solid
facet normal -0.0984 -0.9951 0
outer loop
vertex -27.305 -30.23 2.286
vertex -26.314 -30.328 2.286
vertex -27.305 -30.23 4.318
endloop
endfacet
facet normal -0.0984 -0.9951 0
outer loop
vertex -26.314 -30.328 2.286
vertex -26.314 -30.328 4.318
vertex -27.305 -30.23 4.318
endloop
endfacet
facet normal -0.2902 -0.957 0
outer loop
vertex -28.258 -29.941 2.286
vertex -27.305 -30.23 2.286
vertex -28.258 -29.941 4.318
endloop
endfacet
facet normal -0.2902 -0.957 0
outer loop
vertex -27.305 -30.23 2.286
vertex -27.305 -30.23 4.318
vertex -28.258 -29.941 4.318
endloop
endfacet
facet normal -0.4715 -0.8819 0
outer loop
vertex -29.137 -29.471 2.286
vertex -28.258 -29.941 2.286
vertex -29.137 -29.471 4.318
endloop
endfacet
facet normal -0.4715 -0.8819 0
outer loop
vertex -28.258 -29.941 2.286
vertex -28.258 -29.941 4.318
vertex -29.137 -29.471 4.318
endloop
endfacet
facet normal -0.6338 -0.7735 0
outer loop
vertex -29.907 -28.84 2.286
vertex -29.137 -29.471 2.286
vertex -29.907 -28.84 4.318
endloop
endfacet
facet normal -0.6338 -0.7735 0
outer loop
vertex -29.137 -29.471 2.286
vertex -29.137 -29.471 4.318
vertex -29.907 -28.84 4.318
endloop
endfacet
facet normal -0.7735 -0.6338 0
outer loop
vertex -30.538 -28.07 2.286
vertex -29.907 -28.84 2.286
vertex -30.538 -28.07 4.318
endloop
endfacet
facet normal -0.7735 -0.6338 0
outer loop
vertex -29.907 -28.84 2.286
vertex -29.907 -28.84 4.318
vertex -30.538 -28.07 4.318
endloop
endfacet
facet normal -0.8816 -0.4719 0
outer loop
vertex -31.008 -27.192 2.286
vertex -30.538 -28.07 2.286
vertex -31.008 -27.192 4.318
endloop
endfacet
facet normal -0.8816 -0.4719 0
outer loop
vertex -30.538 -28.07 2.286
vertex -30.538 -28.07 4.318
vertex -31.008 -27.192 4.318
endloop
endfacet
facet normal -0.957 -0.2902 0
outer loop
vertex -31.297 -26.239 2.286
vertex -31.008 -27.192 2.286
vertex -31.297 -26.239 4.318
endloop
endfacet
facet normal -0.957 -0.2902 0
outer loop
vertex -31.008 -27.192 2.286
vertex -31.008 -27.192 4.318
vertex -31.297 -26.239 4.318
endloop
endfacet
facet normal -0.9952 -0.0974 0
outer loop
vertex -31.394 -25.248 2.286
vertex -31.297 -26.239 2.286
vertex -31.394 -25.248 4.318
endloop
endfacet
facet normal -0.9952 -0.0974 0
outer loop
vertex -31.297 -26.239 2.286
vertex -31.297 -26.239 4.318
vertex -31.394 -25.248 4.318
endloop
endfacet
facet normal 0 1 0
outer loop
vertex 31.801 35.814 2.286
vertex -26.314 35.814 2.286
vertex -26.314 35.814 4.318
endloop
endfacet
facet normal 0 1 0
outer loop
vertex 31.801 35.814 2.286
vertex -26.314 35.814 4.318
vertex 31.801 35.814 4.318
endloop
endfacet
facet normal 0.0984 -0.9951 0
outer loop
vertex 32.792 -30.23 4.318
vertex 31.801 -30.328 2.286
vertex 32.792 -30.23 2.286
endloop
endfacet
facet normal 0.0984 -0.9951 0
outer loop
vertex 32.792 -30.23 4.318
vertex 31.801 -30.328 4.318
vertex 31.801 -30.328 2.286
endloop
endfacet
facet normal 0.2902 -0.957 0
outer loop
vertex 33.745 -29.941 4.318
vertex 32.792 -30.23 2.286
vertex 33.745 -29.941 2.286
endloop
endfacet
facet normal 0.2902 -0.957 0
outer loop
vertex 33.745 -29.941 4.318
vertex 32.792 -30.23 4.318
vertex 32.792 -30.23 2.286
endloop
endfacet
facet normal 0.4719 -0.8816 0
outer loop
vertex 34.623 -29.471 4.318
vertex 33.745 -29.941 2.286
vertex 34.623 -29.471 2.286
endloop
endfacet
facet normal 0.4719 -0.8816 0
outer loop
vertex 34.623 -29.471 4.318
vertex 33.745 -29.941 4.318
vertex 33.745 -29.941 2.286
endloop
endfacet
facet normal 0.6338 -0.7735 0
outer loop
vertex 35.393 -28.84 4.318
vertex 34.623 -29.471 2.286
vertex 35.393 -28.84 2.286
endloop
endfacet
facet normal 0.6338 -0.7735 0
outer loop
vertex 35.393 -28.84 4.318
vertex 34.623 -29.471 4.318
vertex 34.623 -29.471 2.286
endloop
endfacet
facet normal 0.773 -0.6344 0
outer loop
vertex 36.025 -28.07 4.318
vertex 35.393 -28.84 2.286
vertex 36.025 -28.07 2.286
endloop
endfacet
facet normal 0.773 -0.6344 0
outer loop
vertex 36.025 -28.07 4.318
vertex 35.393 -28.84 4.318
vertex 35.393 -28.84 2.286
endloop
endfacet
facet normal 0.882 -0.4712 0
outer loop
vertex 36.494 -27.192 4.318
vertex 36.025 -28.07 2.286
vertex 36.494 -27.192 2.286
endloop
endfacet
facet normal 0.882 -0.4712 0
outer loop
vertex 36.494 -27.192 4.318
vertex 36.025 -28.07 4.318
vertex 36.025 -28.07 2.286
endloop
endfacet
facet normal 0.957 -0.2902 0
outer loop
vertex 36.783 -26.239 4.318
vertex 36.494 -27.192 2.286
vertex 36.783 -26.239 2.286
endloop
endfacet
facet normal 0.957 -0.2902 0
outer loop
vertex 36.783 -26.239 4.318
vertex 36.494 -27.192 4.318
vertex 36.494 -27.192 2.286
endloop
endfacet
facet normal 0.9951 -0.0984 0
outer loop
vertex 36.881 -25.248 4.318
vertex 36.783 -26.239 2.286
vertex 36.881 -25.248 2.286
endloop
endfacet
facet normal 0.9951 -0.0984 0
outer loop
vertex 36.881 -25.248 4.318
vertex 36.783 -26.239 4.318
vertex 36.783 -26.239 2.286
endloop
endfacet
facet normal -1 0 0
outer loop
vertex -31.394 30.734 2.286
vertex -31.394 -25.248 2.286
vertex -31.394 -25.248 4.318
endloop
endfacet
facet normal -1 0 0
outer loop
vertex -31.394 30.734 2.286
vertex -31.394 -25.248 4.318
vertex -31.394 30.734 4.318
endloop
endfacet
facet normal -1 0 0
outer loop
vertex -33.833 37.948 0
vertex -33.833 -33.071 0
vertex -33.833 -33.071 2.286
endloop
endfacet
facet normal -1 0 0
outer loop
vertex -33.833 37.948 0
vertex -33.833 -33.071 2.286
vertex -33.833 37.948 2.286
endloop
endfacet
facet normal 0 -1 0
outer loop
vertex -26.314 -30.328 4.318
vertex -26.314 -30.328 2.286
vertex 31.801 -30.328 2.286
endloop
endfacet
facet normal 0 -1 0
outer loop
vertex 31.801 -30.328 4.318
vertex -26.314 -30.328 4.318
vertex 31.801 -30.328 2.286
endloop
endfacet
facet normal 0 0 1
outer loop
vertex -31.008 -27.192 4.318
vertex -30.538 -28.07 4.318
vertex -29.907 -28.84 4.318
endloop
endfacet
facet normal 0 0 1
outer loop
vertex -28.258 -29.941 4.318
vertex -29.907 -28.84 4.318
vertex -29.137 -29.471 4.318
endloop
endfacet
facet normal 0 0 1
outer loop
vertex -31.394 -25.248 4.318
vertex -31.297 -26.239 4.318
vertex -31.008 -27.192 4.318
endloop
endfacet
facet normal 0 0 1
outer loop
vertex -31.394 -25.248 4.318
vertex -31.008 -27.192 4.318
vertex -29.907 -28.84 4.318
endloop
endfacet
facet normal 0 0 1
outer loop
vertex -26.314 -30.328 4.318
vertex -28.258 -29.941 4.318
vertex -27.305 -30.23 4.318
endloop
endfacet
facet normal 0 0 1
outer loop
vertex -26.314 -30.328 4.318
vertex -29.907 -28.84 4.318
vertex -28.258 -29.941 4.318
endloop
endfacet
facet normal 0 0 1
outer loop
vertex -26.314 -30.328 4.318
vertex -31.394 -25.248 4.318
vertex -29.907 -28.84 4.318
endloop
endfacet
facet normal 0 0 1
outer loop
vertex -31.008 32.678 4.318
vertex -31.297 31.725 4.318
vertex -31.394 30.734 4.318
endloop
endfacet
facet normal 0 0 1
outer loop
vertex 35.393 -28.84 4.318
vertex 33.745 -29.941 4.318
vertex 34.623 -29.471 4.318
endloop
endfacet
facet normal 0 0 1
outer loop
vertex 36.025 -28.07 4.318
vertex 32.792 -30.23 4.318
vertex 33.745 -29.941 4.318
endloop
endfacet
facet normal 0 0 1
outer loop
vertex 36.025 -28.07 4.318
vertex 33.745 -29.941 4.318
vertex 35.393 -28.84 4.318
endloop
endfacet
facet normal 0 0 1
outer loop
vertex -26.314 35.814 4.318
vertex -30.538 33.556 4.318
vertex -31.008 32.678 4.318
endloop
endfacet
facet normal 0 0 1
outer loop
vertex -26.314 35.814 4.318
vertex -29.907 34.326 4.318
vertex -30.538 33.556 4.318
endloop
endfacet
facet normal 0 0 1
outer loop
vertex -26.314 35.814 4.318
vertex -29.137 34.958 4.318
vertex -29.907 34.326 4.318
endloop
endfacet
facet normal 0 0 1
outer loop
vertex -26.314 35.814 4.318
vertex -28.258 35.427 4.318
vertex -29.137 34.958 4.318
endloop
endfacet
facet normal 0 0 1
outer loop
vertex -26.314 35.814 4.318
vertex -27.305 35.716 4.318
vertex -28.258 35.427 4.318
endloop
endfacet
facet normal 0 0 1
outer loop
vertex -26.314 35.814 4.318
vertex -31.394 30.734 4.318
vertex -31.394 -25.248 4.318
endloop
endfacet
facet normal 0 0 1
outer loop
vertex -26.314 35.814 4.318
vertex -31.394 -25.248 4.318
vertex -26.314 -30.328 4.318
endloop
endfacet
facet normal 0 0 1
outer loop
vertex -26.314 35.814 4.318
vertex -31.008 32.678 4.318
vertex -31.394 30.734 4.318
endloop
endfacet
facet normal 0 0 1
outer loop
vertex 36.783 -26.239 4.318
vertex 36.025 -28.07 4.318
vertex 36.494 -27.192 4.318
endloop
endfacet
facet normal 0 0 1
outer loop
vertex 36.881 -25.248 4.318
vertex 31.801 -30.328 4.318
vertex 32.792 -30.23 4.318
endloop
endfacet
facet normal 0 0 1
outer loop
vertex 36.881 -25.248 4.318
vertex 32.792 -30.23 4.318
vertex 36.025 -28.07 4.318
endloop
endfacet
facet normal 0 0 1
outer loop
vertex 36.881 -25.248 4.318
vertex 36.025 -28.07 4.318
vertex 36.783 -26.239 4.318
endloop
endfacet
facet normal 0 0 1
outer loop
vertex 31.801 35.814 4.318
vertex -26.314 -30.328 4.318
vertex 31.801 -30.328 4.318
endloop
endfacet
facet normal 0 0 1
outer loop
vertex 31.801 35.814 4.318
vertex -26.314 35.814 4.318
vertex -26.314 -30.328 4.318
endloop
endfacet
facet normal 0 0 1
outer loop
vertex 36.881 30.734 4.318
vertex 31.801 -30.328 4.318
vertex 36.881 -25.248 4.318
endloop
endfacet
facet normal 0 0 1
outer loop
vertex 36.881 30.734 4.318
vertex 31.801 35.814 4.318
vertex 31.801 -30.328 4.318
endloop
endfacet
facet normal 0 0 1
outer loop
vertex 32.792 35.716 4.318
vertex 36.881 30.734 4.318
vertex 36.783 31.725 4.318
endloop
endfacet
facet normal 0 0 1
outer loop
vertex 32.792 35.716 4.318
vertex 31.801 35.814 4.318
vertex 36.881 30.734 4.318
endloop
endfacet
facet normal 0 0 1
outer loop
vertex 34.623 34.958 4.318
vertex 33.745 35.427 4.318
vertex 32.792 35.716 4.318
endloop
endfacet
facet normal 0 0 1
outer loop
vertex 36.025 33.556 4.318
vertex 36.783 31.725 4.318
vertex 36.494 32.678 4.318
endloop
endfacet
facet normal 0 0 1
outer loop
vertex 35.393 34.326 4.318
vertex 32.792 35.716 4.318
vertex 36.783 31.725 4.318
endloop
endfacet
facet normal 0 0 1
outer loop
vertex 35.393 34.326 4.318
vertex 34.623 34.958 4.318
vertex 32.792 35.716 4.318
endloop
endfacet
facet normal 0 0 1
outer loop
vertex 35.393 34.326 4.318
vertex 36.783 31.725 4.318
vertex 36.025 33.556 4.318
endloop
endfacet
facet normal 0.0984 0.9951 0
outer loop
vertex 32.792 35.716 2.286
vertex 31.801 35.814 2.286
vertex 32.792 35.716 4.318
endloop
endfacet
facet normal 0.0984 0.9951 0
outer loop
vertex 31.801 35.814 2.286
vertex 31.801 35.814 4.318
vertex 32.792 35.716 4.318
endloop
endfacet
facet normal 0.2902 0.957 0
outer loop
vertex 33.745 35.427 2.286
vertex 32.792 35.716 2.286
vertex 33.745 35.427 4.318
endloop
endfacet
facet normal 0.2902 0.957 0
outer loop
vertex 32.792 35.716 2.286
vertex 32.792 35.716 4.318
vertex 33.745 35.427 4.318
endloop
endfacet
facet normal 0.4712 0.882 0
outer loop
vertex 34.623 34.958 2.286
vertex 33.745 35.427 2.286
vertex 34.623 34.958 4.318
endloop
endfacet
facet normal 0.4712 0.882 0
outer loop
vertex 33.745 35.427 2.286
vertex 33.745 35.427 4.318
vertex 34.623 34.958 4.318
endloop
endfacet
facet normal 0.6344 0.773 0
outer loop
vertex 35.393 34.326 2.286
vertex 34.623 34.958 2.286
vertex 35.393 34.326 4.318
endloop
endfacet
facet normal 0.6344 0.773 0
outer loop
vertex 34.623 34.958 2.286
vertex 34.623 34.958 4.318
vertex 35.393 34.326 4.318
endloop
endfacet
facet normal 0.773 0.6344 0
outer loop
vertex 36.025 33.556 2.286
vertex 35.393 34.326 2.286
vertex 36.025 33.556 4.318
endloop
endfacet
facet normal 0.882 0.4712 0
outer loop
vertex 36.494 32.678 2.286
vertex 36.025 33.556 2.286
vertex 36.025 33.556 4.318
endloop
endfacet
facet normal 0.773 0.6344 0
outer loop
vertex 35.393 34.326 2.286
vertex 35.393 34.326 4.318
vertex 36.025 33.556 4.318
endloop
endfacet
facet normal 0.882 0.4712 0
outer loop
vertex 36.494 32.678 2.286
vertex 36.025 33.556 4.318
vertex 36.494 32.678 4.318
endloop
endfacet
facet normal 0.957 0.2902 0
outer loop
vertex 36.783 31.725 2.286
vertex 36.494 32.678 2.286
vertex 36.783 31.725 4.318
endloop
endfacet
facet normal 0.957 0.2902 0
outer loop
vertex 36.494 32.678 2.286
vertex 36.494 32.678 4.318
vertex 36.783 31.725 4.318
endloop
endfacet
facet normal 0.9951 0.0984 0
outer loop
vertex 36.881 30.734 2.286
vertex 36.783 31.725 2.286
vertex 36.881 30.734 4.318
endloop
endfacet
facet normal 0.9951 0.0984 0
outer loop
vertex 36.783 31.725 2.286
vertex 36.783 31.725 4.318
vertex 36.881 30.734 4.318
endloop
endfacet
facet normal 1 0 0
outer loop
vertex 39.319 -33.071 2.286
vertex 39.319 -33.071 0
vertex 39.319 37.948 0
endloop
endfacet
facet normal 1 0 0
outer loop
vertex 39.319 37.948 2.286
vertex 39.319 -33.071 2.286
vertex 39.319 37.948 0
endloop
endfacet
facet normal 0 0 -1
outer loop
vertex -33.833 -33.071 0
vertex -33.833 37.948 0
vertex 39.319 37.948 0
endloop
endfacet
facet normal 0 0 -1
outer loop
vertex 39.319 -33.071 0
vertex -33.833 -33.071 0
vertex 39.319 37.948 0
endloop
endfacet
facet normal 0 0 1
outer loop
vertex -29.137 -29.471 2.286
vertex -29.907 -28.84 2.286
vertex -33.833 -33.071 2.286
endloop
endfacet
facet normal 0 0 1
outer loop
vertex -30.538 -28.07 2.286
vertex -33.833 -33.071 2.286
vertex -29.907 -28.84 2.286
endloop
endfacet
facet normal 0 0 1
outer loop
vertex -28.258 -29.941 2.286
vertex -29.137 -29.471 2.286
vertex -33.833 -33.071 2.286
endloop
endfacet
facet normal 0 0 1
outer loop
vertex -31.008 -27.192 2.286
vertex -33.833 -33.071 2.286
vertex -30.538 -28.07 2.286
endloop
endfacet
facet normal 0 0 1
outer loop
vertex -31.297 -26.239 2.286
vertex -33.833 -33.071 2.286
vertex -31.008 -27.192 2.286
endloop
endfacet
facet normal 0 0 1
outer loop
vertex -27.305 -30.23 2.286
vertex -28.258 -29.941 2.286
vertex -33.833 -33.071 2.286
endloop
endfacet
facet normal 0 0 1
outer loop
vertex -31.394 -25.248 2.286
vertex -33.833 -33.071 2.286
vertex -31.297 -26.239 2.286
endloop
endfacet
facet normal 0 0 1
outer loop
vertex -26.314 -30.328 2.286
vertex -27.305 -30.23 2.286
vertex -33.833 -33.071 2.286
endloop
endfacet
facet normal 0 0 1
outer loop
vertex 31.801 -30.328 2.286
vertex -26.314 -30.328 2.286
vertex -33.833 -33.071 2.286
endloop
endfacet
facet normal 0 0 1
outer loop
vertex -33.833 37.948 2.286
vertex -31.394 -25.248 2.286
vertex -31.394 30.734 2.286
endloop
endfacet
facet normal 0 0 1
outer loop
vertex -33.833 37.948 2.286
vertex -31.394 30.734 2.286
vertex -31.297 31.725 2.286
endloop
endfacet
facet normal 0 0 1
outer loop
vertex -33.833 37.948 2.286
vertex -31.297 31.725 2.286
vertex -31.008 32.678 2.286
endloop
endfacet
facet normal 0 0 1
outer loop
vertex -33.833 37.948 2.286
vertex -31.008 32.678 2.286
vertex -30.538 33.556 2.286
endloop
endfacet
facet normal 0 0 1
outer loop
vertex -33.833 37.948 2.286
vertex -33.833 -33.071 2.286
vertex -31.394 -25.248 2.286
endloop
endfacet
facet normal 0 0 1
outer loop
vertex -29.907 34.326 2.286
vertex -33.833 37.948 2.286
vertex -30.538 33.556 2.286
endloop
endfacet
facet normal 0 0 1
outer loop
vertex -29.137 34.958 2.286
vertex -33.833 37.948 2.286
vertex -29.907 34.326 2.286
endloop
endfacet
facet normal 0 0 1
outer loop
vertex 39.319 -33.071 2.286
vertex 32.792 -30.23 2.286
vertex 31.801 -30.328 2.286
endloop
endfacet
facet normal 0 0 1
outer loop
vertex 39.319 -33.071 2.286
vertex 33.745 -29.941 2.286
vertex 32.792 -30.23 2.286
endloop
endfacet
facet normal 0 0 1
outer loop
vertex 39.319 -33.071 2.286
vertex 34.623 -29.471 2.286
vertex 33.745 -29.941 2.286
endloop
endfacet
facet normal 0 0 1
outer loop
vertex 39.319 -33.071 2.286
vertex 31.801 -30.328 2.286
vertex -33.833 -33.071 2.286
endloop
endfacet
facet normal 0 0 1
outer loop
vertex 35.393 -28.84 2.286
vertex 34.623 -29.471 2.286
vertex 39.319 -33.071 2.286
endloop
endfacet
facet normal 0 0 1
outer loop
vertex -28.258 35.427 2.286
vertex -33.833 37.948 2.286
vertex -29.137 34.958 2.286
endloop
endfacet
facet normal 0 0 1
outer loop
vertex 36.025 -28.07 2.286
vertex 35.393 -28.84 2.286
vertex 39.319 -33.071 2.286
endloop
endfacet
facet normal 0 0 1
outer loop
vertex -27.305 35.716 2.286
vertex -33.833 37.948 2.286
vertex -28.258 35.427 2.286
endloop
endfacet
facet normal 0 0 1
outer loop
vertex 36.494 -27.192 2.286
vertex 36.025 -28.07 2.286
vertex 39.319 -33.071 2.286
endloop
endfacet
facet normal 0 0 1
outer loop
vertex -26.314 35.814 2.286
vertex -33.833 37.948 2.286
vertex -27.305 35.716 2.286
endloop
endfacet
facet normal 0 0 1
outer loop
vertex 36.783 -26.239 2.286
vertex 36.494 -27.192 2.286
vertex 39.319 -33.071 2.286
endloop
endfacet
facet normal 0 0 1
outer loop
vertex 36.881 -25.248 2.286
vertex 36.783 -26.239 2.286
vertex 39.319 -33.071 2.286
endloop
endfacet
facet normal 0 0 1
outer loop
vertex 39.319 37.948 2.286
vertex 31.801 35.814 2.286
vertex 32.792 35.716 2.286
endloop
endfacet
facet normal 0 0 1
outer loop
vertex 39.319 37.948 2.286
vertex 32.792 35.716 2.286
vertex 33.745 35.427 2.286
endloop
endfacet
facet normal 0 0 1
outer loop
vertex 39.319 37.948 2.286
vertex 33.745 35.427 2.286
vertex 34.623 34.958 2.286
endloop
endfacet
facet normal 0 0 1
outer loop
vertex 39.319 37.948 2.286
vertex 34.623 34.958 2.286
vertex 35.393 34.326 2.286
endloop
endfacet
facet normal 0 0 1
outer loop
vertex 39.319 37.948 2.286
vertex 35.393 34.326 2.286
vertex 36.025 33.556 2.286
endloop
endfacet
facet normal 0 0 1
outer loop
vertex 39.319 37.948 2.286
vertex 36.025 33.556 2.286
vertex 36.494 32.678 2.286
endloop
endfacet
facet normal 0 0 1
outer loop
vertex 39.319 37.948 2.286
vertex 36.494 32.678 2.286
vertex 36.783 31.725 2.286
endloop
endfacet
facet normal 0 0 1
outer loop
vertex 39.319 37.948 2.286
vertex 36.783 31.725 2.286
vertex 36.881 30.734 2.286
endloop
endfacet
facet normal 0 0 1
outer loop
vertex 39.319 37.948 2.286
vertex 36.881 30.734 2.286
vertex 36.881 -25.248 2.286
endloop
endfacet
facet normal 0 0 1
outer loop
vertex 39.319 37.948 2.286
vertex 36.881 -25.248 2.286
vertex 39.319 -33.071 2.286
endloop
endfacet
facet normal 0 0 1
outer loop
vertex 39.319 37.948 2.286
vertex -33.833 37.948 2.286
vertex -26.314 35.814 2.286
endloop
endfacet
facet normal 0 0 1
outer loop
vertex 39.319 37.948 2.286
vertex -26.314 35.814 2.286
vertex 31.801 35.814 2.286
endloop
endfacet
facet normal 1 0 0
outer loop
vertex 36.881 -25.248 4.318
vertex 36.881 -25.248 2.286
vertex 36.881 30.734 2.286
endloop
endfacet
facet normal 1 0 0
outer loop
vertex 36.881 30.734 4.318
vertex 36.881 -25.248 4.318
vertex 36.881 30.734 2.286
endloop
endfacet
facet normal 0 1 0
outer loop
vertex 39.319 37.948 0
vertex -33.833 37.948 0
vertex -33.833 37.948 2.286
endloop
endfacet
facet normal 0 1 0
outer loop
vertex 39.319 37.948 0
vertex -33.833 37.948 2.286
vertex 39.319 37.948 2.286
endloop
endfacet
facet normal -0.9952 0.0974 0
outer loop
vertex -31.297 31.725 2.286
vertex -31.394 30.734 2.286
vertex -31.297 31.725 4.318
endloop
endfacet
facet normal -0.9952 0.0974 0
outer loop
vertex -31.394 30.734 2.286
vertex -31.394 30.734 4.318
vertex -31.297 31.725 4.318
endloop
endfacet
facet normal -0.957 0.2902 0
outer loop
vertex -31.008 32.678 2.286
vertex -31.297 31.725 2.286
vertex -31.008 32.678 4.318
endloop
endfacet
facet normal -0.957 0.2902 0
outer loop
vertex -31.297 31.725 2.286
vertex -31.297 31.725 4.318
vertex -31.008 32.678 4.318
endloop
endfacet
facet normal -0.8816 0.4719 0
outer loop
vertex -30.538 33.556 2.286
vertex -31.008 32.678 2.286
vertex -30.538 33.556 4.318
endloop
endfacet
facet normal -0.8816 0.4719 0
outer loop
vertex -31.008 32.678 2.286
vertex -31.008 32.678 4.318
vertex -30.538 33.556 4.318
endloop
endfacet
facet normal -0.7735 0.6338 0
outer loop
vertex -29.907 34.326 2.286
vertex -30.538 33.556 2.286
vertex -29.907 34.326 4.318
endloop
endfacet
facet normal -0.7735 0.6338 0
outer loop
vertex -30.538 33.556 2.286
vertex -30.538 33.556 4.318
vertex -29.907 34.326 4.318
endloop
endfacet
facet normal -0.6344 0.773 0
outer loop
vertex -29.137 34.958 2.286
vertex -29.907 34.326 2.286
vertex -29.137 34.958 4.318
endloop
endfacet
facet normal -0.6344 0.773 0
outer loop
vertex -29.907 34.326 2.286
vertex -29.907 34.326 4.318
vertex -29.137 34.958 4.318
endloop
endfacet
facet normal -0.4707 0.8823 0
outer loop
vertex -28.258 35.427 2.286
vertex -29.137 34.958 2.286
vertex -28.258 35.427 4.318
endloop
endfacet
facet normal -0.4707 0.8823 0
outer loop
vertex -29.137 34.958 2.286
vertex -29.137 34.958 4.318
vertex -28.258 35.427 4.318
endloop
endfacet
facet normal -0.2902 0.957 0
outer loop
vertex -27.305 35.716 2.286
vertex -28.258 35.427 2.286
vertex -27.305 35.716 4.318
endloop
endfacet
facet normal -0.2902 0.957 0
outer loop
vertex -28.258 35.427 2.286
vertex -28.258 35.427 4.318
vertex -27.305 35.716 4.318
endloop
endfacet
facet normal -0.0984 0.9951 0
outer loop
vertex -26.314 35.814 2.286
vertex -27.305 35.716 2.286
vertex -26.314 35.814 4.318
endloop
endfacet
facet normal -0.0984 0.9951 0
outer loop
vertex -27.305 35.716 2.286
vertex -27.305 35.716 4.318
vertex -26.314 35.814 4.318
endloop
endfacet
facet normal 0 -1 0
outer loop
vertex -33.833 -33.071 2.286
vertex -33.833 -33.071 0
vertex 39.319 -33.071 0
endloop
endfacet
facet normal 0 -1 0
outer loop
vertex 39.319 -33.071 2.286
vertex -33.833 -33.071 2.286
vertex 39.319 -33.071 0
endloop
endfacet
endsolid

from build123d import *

# Parameters (mm, degrees)
F0_W     = 73.152002
F0_H     = 71.018402
F1_DEPTH = 2.286
F3_W     = 68.275202
F3_H     = 66.141603
F4_DEPTH = 2.032
F5_R     = 5.08
F6_R     = 5.08
F7_R     = 5.08
F8_R     = 5.08


with BuildPart() as f1:
    # F0 (on Top) → F1 (new body)
    with BuildSketch(Plane.XY):
        with Locations((2.743201, 2.438402)):
            Rectangle(F0_W, F0_H)
    extrude(amount=F1_DEPTH)

    # F3 (on face) → F4 (join)
    with BuildSketch(Plane.XY.offset(2.286)):
        with Locations((2.743201, 2.7432)):
            Rectangle(F3_W, F3_H)
    extrude(amount=F4_DEPTH)

    # F5
    f5_edges = [f1.edges().sort_by_distance(p)[0] for p in [
        (36.880802, -30.327601, 3.302),
    ]]
    fillet(f5_edges, radius=F5_R)

    # F6
    f6_edges = [f1.edges().sort_by_distance(p)[0] for p in [
        (-31.3944, -30.327601, 3.302),
    ]]
    fillet(f6_edges, radius=F6_R)

    # F7
    f7_edges = [f1.edges().sort_by_distance(p)[0] for p in [
        (-31.3944, 35.814002, 3.302),
    ]]
    fillet(f7_edges, radius=F7_R)

    # F8
    f8_edges = [f1.edges().sort_by_distance(p)[0] for p in [
        (36.880802, 35.814002, 3.302),
    ]]
    fillet(f8_edges, radius=F8_R)


solid = f1.part
